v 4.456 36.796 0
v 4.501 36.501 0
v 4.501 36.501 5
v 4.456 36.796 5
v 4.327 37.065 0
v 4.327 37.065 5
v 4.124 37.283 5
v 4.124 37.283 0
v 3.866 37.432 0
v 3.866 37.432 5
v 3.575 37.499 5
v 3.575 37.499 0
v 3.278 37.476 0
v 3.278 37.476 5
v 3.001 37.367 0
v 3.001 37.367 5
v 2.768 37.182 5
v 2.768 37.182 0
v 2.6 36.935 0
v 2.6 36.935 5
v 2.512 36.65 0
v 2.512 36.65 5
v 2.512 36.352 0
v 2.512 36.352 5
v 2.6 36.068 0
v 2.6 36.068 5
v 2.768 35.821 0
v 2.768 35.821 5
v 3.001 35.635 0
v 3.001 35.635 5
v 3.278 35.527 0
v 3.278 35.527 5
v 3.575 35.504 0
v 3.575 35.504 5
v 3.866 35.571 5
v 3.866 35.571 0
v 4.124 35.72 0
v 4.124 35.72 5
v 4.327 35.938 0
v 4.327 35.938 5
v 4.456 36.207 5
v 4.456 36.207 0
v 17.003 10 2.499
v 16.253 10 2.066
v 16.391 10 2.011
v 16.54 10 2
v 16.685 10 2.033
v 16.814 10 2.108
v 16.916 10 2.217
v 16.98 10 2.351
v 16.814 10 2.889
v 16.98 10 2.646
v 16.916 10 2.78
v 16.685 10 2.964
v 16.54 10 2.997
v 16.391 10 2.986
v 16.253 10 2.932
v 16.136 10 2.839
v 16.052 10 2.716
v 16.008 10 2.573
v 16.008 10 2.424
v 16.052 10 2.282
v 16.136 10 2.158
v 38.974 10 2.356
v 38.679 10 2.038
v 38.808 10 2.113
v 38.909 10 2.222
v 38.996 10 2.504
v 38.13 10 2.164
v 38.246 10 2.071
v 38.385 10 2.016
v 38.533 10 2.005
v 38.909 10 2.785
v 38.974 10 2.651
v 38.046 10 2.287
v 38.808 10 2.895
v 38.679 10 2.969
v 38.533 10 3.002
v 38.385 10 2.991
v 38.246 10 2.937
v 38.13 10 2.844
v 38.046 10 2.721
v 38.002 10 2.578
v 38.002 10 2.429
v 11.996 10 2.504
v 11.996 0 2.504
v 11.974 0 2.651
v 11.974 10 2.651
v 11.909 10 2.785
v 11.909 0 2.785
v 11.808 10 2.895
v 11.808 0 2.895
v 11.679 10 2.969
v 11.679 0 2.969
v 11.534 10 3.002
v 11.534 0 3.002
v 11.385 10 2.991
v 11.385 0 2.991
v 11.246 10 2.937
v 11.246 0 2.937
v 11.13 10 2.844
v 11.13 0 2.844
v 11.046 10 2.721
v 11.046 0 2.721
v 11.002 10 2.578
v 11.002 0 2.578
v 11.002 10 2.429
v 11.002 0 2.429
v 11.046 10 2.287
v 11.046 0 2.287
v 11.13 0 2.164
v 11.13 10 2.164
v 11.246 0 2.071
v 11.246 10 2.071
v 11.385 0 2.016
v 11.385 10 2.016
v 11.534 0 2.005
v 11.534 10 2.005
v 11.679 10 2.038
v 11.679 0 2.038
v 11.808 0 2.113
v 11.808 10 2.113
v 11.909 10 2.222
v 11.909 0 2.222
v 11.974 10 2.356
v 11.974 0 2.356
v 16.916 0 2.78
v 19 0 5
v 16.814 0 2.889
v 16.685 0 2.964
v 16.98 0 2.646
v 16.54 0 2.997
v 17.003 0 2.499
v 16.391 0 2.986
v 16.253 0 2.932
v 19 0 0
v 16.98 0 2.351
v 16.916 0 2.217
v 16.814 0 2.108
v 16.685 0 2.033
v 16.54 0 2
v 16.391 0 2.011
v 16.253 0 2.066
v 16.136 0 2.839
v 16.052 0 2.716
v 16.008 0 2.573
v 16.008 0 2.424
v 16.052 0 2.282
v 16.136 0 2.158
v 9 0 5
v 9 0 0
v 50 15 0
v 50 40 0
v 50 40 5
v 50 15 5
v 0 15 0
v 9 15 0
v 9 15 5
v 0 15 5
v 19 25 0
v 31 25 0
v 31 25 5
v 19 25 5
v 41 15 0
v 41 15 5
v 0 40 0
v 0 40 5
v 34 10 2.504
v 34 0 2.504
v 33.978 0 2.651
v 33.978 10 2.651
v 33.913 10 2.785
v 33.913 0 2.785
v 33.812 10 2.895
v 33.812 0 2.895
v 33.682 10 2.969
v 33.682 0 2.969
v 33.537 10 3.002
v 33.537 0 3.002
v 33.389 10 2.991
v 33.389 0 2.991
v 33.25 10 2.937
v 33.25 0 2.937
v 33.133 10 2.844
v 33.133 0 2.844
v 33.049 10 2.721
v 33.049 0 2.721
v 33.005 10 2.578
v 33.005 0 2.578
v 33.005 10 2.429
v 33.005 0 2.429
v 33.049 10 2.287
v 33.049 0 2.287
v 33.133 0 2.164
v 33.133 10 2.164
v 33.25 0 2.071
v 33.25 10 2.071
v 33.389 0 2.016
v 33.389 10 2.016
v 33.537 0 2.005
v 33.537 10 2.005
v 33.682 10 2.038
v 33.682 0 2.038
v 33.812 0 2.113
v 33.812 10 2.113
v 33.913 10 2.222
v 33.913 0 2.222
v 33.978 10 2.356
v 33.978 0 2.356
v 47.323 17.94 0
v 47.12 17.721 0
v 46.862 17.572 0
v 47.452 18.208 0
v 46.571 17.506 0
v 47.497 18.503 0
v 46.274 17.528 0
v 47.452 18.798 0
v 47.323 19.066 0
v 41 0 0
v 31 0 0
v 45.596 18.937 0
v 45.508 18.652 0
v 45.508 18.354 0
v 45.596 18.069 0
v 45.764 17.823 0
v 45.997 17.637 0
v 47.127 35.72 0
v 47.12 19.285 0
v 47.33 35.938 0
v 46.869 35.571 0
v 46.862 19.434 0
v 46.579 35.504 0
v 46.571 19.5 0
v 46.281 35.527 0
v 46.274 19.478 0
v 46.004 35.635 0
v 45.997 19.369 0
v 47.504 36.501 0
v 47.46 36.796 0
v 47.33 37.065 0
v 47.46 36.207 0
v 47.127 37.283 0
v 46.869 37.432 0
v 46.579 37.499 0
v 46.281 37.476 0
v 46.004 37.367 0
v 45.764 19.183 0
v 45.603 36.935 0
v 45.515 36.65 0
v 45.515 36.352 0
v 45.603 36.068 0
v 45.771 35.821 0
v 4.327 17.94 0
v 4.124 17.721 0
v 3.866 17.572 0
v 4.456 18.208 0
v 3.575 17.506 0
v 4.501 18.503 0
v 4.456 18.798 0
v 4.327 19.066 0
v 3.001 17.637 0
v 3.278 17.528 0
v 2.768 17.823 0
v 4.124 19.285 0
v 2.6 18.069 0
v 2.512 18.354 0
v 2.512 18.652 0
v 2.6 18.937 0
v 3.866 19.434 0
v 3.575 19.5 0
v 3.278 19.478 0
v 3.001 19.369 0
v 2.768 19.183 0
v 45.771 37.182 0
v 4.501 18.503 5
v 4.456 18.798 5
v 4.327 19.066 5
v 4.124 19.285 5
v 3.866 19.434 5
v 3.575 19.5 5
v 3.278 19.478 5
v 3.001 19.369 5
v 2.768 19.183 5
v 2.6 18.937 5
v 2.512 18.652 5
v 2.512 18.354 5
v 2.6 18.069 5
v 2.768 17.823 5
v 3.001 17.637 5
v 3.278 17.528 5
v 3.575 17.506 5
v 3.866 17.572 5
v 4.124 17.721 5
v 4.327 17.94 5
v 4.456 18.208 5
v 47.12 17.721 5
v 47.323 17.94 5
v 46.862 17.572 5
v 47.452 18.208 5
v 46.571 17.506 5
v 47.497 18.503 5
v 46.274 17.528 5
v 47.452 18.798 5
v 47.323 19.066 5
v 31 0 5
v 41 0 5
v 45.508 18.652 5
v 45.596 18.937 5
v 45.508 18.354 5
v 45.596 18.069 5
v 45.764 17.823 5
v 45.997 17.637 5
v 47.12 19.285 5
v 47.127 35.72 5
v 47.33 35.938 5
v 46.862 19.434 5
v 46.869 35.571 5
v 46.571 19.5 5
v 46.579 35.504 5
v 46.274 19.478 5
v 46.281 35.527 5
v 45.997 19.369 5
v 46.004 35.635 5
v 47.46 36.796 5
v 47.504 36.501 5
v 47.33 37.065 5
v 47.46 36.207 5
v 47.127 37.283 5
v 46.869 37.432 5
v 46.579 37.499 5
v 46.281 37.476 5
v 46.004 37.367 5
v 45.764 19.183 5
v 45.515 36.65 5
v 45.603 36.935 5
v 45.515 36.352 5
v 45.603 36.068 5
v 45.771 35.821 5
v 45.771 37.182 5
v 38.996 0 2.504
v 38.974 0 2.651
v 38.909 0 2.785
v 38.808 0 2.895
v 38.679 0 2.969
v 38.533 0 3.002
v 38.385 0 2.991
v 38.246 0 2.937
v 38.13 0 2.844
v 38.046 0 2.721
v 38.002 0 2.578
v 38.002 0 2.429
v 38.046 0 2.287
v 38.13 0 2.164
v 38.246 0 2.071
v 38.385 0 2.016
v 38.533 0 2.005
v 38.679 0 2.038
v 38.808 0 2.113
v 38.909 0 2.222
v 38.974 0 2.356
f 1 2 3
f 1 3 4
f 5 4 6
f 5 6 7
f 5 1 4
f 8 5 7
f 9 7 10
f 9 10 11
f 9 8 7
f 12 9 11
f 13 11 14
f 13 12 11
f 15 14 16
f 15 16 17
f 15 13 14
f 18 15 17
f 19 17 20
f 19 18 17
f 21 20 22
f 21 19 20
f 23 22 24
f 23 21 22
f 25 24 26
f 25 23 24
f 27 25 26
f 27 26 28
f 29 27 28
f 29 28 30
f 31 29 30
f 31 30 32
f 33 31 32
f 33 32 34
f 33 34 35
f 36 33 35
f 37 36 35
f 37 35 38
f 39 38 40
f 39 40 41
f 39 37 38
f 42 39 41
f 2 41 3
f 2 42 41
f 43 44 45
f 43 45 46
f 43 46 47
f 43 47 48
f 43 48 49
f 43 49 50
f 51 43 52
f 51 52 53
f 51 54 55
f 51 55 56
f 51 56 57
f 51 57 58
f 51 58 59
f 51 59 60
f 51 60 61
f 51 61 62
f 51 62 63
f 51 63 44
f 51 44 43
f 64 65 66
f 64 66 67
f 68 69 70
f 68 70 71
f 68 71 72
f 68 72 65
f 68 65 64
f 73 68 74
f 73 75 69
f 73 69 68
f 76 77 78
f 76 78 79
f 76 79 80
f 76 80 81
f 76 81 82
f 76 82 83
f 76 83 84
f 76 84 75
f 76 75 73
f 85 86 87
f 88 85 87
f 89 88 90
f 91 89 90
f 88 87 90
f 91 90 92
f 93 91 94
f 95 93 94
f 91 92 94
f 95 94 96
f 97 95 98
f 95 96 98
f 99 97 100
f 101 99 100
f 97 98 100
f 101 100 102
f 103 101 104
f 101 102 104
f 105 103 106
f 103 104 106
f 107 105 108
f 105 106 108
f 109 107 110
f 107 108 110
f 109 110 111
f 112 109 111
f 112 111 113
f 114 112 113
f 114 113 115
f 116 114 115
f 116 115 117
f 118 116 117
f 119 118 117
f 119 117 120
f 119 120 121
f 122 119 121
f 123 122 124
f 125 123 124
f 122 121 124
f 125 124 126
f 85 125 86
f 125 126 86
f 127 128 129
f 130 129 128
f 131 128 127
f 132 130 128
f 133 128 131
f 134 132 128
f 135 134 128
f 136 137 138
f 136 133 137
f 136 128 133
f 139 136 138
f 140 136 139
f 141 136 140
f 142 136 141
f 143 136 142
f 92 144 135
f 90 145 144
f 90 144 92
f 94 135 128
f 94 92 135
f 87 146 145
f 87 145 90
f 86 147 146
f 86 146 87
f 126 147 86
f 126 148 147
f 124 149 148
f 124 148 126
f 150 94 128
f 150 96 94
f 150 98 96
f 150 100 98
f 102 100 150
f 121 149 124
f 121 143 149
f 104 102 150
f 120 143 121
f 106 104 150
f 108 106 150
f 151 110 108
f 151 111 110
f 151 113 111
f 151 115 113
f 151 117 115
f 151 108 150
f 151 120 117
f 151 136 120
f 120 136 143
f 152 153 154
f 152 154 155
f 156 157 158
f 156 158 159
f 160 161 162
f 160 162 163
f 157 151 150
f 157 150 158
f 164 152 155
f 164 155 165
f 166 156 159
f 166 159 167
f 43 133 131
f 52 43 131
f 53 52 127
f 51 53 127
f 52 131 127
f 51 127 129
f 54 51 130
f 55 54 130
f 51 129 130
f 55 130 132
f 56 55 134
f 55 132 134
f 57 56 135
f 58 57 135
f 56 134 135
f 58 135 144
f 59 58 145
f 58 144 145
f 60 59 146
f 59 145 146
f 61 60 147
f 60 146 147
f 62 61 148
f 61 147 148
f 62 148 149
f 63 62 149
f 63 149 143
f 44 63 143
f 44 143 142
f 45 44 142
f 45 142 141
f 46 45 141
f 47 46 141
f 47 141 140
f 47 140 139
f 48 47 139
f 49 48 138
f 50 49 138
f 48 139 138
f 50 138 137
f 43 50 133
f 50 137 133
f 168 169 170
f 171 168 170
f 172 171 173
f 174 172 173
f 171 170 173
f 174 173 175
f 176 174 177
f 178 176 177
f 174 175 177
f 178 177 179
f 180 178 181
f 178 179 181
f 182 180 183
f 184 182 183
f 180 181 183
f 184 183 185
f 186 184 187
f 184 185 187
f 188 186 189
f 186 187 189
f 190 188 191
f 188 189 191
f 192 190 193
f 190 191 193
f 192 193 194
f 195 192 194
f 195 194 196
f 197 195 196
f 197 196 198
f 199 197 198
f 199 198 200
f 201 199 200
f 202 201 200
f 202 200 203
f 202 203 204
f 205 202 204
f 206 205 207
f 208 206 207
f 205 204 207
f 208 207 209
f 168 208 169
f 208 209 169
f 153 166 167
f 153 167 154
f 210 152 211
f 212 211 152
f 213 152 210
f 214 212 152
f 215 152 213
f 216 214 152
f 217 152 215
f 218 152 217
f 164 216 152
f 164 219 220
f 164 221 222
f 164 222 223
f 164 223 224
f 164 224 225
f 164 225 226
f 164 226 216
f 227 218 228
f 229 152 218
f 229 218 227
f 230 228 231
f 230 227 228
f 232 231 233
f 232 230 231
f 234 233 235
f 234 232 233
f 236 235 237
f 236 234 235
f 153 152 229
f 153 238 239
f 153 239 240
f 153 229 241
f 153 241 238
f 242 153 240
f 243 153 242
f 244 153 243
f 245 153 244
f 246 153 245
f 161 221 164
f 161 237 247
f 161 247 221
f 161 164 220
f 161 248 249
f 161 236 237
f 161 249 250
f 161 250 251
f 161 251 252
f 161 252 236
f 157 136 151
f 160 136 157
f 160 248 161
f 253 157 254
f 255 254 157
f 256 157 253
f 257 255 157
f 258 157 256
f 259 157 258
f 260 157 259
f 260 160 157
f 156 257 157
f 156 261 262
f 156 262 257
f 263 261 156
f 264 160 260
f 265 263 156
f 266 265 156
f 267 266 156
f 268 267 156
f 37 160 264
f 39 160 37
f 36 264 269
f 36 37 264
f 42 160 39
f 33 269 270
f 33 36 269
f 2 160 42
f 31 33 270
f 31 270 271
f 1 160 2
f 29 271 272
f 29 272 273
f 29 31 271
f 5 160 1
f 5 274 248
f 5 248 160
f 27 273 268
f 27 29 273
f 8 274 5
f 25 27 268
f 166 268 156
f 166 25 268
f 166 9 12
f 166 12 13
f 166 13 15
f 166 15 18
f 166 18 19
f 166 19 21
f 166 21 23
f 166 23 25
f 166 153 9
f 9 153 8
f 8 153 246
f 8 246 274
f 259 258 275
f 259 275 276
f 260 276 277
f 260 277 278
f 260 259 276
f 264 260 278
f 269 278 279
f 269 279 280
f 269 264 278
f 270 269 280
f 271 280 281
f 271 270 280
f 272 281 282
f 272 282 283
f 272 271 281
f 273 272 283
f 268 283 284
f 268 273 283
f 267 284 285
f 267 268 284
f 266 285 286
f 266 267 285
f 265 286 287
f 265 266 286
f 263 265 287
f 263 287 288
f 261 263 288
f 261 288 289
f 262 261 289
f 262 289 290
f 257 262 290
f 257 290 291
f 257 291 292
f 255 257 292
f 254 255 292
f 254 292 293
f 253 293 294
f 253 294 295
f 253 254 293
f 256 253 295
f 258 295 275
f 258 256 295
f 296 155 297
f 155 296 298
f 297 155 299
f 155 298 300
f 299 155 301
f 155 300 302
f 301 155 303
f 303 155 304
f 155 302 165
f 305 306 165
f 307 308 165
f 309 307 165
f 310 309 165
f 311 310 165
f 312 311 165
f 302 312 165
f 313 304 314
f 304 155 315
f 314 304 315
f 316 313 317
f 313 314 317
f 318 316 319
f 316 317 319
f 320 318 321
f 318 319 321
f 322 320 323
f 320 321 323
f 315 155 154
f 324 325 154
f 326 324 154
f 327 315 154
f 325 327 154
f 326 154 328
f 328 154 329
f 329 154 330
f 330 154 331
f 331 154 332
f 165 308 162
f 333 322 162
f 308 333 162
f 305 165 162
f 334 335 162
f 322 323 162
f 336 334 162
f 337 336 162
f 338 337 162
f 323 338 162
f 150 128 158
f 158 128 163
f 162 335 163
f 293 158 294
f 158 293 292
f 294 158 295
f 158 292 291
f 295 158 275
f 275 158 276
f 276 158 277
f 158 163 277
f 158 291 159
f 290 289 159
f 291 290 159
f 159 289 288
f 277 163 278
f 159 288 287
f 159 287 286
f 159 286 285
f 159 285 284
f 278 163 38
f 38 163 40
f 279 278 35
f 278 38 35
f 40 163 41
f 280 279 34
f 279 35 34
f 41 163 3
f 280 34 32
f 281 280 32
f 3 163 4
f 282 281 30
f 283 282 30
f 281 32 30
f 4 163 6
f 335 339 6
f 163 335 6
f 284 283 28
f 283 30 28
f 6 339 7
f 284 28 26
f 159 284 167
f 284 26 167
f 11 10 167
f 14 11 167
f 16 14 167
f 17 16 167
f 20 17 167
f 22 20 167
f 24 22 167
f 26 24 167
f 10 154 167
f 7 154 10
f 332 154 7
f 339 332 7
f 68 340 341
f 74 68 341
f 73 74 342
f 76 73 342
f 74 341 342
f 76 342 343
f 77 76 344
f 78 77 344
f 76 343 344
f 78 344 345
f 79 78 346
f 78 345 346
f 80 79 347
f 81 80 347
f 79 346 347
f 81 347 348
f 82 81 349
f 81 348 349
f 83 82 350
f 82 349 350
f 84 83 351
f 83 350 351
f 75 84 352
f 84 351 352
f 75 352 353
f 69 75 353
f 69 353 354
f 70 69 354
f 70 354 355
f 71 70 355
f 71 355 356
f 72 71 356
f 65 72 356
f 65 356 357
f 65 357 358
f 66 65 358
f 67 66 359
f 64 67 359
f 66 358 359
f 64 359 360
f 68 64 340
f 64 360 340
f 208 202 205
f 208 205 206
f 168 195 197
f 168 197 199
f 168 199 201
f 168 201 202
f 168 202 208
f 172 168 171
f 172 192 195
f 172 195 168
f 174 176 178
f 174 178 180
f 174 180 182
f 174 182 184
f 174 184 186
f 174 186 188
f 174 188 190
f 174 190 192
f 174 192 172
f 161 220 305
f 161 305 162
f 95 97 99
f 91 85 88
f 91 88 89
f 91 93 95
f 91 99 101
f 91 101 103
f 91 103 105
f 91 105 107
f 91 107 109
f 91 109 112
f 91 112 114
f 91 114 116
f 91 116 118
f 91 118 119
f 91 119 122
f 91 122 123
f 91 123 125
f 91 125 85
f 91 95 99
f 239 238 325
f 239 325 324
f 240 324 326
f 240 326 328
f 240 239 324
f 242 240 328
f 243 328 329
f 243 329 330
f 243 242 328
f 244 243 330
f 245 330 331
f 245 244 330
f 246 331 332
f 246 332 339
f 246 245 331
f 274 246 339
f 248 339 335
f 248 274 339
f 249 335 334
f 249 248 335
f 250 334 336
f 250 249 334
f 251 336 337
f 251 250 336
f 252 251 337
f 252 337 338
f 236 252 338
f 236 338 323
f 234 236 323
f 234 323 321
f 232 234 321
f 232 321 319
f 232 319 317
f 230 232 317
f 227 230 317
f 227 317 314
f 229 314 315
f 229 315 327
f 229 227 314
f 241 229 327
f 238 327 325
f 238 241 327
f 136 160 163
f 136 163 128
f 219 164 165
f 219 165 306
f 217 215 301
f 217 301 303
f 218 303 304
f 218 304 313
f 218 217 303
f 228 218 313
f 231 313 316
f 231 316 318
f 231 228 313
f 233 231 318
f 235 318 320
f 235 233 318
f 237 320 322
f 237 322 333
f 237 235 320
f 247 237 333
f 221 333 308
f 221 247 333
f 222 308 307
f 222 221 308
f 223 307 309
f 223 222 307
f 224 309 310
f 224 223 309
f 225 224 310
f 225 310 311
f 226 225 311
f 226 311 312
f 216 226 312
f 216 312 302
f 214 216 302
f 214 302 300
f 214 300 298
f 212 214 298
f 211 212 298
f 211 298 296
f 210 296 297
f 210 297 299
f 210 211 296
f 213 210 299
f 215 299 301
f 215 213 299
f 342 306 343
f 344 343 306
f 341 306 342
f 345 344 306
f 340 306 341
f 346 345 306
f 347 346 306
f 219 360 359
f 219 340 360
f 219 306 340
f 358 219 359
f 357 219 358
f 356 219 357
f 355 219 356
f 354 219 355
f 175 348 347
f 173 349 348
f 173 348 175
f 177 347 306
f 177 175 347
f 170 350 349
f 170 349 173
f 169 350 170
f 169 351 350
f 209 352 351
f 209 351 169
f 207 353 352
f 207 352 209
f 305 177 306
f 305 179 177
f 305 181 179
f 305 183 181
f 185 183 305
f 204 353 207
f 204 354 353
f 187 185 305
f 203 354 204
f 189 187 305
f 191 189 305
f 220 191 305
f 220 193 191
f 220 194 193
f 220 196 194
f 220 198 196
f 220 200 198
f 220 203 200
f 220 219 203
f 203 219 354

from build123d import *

# Parameters (mm, degrees)
SKETCH001_R  = 1
PAD_DEPTH    = 5
SKETCH002_R  = 0.5
POCKET_DEPTH = 10


with BuildPart() as part:
    # Sketch001 → Pad (new body)
    with BuildSketch(Plane.XY):
        Polygon((9, 0), (9, 15), (0, 15), (0, 40), (50, 40), (50, 15), (41, 15), (41, 0), (31, 0), (31, 25), (19, 25), (19, 0), align=None)
        with Locations((46.504002, 36.501442)):
            Circle(SKETCH001_R, mode=Mode.SUBTRACT)
        with Locations((3.500559, 36.501442)):
            Circle(SKETCH001_R, mode=Mode.SUBTRACT)
        with Locations((3.500559, 18.503159)):
            Circle(SKETCH001_R, mode=Mode.SUBTRACT)
        with Locations((46.496666, 18.503159)):
            Circle(SKETCH001_R, mode=Mode.SUBTRACT)
    extrude(amount=PAD_DEPTH)

    # Sketch002 (on Face9 of Pad) → Pocket (cut)
    with BuildSketch(Plane.XZ):
        with Locations((38.496052, 2.503616)):
            Circle(SKETCH002_R)
        with Locations((33.499767, 2.503616)):
            Circle(SKETCH002_R)
        with Locations((16.502573, 2.498577)):
            Circle(SKETCH002_R)
        with Locations((11.496223, 2.503616)):
            Circle(SKETCH002_R)
    extrude(amount=-POCKET_DEPTH, mode=Mode.SUBTRACT)


solid = part.part
